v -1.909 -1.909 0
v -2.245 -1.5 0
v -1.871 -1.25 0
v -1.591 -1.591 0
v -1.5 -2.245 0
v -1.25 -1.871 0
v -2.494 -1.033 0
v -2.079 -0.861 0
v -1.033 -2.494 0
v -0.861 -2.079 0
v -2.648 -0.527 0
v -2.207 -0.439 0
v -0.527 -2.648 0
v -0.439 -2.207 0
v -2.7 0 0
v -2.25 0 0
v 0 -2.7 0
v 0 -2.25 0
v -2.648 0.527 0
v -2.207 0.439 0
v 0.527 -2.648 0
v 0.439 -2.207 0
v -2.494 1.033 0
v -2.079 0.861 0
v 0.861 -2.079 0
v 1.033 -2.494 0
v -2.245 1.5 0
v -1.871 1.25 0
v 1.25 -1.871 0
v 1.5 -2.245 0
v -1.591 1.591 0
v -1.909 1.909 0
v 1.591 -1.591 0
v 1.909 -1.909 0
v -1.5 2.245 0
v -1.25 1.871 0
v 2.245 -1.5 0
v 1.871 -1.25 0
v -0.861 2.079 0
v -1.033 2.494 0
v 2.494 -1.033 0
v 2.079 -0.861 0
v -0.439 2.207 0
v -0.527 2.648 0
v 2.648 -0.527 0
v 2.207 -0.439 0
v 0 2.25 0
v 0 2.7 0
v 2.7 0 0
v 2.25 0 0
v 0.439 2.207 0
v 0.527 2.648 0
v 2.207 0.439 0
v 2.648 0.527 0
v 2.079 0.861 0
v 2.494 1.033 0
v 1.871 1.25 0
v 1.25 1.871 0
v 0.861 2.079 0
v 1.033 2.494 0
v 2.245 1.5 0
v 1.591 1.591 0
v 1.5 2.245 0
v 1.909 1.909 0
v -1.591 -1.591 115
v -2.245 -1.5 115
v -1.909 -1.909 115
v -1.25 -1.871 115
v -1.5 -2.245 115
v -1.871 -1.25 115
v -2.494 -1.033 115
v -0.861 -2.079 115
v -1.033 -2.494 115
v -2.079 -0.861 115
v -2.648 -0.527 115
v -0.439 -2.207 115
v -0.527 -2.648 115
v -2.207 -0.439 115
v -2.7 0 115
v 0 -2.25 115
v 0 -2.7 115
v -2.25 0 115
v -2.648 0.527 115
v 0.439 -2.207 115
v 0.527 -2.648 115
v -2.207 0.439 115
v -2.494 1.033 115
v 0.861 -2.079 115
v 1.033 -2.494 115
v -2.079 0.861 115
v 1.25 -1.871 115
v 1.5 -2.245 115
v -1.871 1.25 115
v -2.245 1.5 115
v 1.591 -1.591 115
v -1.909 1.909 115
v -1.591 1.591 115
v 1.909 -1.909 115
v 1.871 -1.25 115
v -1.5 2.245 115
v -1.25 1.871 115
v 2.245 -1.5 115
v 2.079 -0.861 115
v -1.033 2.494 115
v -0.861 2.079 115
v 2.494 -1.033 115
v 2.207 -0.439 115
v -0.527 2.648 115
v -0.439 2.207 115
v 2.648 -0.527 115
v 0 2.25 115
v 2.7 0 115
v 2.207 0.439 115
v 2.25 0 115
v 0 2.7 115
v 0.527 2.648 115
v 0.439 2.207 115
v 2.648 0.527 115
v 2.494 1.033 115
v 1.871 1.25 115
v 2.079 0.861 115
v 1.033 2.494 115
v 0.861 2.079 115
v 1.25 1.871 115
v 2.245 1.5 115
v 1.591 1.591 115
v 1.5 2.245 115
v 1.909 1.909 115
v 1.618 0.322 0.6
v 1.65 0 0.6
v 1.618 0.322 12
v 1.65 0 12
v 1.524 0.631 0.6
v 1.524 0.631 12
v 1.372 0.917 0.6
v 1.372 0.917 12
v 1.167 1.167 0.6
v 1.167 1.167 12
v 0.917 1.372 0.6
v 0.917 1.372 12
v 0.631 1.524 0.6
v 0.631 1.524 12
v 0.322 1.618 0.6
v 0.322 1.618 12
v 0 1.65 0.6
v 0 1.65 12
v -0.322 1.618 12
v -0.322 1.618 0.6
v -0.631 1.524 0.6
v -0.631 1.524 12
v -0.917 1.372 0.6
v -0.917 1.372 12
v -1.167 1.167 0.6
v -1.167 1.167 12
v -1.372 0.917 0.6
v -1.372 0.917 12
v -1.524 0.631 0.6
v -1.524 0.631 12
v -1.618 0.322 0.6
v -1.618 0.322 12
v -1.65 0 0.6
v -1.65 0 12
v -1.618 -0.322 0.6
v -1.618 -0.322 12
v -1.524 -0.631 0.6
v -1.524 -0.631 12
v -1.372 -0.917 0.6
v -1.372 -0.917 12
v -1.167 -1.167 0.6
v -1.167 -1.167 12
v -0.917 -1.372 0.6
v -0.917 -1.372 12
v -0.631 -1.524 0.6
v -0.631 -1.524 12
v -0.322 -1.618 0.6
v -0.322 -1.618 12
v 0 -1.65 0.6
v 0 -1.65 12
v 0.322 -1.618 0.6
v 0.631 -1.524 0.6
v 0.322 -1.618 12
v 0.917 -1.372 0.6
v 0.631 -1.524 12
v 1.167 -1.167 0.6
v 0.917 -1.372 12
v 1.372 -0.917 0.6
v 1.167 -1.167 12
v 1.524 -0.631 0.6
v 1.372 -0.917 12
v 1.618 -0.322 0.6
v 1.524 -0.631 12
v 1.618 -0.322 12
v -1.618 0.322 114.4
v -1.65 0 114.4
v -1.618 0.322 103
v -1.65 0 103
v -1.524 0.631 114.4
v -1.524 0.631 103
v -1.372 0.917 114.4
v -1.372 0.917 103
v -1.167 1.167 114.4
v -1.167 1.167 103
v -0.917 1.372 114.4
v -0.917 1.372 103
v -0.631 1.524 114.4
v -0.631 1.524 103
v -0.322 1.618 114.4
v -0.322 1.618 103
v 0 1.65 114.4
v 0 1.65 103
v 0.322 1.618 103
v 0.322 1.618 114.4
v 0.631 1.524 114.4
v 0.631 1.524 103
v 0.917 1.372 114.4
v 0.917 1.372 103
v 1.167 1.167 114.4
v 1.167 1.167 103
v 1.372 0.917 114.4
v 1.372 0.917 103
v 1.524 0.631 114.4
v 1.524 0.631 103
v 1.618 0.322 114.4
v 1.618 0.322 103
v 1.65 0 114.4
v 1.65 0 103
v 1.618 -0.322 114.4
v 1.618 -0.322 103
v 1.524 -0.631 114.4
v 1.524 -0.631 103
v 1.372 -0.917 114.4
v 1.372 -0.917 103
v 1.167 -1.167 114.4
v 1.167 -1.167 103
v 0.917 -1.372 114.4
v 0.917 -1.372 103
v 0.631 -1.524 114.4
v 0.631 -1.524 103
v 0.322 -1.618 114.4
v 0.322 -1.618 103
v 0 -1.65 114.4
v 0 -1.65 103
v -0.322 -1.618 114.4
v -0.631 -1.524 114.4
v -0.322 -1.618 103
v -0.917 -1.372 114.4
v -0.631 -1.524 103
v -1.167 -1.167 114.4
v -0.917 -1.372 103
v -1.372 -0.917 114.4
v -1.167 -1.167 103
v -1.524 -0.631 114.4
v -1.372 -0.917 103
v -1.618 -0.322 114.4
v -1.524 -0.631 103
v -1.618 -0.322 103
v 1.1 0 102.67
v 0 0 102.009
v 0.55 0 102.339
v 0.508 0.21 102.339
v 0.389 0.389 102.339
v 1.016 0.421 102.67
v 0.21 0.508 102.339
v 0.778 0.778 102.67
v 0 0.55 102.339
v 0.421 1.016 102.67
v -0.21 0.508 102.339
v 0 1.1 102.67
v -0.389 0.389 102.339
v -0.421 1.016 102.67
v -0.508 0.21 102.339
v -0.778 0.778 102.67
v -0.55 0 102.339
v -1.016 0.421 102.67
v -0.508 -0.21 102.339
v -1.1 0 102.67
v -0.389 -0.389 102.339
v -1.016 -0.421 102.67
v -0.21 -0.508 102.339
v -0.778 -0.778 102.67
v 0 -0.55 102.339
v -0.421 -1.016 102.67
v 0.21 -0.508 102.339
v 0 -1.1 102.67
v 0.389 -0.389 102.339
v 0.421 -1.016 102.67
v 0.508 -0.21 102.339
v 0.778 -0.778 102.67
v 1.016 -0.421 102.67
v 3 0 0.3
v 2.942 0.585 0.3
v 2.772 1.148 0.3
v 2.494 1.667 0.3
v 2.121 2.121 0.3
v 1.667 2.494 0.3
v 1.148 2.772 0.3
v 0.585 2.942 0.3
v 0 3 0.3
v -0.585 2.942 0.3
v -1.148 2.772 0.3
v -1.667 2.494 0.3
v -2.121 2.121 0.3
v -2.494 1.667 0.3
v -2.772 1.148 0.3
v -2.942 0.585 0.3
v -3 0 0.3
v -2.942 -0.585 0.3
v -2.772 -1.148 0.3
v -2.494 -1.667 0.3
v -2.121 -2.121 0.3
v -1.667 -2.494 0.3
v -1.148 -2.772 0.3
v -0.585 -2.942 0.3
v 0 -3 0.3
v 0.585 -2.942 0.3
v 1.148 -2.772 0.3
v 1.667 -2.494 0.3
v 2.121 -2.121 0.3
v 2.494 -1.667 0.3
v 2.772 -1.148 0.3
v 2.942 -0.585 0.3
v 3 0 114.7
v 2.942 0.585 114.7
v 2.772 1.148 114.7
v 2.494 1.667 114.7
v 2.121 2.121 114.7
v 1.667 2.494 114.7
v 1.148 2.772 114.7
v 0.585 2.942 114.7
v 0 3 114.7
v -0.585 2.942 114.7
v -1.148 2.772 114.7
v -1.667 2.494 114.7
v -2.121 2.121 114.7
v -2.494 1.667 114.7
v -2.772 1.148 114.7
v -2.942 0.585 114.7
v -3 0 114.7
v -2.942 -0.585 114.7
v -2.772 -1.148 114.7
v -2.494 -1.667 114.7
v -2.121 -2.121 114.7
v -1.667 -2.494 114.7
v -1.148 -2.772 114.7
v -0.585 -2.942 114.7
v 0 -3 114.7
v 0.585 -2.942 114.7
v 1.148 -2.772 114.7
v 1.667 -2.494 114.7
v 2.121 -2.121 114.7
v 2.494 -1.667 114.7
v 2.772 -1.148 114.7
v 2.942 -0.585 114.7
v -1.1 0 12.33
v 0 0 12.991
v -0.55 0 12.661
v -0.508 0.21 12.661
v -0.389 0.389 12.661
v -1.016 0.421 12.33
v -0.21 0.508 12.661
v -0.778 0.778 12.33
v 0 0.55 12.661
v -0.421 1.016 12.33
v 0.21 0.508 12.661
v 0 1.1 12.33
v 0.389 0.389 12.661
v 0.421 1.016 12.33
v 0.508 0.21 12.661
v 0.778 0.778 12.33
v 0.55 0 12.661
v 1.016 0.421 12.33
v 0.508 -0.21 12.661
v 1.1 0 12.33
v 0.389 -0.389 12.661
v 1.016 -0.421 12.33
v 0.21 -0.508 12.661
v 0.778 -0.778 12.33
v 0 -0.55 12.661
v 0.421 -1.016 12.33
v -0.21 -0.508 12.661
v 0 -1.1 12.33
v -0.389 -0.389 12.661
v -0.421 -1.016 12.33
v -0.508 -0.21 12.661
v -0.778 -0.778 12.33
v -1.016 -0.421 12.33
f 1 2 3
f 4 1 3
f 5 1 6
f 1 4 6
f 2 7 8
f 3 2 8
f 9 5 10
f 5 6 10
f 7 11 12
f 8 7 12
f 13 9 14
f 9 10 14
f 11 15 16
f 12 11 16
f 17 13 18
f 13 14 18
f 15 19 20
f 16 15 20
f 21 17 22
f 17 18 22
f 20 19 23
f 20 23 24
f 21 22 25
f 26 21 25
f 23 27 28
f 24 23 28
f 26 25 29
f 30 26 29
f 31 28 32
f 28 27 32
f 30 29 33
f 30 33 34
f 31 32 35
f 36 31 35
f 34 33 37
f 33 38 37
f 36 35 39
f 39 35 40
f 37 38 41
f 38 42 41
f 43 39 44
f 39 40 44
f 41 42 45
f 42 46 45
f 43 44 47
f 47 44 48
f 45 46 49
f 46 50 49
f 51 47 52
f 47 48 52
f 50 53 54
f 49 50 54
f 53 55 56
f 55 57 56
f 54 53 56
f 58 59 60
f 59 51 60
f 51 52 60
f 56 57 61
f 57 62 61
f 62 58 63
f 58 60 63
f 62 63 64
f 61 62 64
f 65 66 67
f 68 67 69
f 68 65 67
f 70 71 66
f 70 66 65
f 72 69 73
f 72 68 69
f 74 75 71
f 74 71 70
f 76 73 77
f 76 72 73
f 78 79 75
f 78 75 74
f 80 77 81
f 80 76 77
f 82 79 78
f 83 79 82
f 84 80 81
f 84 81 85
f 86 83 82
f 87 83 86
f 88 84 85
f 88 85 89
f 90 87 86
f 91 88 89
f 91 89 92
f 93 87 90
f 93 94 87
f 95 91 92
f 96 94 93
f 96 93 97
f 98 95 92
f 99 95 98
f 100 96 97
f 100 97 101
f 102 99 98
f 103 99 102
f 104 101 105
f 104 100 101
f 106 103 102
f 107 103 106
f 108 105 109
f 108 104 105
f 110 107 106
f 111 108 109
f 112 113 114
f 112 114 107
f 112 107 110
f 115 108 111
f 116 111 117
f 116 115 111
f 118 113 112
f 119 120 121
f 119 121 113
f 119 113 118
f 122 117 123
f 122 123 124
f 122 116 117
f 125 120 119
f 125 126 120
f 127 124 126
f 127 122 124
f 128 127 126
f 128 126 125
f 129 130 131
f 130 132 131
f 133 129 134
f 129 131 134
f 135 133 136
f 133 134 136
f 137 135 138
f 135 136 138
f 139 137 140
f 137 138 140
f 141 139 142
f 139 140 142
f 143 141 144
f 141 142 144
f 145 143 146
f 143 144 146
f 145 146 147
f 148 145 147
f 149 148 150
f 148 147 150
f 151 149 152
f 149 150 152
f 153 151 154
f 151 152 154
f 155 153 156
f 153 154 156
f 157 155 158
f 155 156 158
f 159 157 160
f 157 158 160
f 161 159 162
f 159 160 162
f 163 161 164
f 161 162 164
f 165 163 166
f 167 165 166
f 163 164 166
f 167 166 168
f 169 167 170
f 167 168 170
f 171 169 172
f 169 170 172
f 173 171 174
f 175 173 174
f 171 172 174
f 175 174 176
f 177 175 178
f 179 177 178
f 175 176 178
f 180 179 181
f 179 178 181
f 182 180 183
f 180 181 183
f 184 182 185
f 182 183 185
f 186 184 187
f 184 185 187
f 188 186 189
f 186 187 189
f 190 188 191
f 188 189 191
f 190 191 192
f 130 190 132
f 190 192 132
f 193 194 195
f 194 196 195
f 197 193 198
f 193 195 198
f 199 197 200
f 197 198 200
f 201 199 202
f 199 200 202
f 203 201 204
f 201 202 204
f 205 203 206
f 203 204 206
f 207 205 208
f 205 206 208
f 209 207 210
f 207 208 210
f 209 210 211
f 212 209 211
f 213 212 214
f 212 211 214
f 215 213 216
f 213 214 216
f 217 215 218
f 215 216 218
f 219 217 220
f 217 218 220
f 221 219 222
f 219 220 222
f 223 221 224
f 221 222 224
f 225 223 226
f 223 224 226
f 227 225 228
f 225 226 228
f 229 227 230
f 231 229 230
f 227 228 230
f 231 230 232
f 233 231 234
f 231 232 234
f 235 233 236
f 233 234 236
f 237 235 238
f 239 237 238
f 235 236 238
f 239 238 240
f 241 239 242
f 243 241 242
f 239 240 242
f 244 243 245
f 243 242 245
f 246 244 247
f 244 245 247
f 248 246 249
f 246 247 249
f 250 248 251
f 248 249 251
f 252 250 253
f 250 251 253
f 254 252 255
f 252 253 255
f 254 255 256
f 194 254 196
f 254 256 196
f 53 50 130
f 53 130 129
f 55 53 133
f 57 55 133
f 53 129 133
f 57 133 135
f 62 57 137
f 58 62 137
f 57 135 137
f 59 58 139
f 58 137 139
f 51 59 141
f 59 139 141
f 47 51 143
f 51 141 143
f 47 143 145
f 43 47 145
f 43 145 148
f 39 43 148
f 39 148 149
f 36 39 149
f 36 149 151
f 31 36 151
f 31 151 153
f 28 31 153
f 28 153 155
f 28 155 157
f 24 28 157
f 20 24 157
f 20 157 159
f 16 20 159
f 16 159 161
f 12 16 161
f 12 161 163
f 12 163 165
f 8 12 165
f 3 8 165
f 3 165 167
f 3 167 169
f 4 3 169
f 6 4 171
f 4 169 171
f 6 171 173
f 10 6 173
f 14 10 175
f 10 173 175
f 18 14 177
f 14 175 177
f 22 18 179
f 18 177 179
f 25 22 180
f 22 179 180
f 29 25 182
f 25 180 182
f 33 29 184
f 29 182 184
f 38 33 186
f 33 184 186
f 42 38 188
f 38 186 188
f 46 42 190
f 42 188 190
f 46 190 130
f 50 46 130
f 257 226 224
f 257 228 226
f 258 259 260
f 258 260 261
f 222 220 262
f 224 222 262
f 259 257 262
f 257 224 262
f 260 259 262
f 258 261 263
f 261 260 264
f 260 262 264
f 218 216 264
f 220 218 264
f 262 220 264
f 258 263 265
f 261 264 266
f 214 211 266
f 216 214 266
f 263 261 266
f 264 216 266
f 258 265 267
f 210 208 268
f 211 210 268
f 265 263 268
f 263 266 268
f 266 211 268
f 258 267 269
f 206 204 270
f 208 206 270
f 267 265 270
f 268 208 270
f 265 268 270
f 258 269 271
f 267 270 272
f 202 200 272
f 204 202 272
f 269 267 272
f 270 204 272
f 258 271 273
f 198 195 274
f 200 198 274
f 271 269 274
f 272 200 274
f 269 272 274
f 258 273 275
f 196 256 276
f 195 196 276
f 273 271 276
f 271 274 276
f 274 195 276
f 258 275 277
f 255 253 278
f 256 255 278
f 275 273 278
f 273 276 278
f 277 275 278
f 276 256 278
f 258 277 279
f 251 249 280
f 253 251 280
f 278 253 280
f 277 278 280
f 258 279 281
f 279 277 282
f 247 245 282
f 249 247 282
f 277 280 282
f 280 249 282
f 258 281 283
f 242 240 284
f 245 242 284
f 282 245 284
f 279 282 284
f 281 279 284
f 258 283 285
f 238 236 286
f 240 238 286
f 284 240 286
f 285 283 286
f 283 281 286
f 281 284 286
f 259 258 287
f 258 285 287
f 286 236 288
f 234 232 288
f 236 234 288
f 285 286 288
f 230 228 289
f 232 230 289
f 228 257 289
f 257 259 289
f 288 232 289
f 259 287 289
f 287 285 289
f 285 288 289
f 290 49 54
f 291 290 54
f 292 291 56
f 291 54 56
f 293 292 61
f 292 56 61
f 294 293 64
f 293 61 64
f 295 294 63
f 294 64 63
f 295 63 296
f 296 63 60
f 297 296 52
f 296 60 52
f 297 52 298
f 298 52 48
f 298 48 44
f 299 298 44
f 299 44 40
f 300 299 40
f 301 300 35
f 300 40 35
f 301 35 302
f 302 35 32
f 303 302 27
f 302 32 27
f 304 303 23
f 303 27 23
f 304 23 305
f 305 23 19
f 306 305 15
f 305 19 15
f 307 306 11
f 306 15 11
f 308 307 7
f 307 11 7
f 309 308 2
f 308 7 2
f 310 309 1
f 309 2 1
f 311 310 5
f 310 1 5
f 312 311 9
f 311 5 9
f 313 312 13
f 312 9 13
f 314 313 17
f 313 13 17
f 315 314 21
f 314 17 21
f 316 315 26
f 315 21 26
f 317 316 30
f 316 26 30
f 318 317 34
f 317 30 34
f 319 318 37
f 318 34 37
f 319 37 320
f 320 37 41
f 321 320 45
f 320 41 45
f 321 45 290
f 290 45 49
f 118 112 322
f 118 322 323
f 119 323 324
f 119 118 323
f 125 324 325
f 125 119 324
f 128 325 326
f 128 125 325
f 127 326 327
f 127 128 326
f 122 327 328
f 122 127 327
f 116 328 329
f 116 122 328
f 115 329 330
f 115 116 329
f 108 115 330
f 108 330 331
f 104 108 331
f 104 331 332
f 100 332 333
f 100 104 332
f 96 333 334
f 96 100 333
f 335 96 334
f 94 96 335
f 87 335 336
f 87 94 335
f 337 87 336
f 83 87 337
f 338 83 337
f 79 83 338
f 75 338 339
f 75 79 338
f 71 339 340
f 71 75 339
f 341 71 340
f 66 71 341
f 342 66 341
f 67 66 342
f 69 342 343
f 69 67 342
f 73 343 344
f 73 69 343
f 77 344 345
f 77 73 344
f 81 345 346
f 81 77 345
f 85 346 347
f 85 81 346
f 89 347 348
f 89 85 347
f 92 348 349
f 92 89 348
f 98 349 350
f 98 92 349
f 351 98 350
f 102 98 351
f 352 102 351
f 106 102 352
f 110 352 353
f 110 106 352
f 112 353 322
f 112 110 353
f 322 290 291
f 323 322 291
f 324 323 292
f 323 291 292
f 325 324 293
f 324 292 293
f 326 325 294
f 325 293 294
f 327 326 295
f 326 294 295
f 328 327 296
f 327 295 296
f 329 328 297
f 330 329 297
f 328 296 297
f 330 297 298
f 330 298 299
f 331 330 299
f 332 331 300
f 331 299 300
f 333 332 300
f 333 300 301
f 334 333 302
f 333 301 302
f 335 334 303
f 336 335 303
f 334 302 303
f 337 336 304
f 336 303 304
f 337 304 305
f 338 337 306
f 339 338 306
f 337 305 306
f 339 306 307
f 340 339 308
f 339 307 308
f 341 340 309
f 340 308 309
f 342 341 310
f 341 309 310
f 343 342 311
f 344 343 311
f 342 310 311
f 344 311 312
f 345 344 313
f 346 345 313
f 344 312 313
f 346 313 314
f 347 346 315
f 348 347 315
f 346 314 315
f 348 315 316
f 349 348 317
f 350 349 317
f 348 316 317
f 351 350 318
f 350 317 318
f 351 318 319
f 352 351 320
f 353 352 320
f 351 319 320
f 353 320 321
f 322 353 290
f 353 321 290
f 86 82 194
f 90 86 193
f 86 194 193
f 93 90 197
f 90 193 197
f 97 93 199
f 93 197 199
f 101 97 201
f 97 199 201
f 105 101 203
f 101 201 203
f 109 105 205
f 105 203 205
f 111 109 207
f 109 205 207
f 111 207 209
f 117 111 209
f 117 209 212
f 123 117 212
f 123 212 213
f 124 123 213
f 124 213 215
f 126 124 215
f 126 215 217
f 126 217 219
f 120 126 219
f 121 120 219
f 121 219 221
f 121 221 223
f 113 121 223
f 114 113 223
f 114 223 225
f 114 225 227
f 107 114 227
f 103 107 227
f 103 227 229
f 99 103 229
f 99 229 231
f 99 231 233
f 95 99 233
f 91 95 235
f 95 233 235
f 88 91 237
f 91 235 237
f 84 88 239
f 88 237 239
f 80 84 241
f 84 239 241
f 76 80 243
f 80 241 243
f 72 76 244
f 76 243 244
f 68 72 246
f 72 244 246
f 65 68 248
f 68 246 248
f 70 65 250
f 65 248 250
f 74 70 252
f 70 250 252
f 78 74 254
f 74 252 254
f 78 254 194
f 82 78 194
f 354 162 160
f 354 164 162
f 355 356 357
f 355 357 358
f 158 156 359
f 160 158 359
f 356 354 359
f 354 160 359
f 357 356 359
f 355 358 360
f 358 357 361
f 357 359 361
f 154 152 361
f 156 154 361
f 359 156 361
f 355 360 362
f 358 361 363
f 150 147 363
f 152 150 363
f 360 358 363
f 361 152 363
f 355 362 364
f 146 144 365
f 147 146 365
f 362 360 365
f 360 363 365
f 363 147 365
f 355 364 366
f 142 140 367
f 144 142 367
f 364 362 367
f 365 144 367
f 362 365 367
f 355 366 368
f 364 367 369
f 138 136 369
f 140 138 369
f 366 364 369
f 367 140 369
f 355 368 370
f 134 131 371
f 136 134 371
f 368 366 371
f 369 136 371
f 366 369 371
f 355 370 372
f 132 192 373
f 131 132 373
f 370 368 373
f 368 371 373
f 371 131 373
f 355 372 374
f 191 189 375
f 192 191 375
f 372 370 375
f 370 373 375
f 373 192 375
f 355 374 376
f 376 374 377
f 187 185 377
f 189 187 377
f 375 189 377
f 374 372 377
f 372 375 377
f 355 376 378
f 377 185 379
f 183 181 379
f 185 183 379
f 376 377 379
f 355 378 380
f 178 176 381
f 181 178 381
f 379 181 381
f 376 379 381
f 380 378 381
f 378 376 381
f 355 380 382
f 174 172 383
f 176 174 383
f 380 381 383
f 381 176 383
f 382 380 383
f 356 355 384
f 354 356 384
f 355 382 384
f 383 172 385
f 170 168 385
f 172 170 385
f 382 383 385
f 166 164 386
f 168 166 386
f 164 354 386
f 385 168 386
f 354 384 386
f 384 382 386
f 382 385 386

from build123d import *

# Parameters (mm, degrees)
SKETCH_236_R                = 3
EXTRUDE_290_DEPTH           = 115
HOLE_WIZARD_M41_D           = 3.3
HOLE_WIZARD_M41_DEPTH       = 12
HOLE_WIZARD_M41_CSINK_D     = 4.5
HOLE_WIZARD_M41_CSINK_ANGLE = 90
HOLE_WIZARD_M41_TIP         = 0.991420021
HOLE_WIZARD_M42_D           = 3.3
HOLE_WIZARD_M42_DEPTH       = 12
HOLE_WIZARD_M42_CSINK_D     = 4.5
HOLE_WIZARD_M42_CSINK_ANGLE = 90
HOLE_WIZARD_M42_TIP         = 0.991420021
CHAMFER_1_SIZE              = 0.3


with BuildPart() as part:
    # Sketch 236 → Extrude 290 (new body)
    with BuildSketch(Plane.XY):
        Circle(SKETCH_236_R)
    extrude(amount=EXTRUDE_290_DEPTH)

    # Отверстие обработанное метчиком M41
    with Locations(Plane.XY.offset(115)):
        with Locations((0, 0)):
            CounterSinkHole(HOLE_WIZARD_M41_D / 2, HOLE_WIZARD_M41_CSINK_D / 2, depth=HOLE_WIZARD_M41_DEPTH, counter_sink_angle=HOLE_WIZARD_M41_CSINK_ANGLE)
            with Locations((0, 0, -(HOLE_WIZARD_M41_DEPTH + HOLE_WIZARD_M41_TIP / 2))):  # 118° drill point
                Cone(0, HOLE_WIZARD_M41_D / 2, HOLE_WIZARD_M41_TIP, mode=Mode.SUBTRACT)

    # Отверстие обработанное метчиком M42
    with Locations(Plane(origin=(0, 0, 0), x_dir=(-1, 0, 0), z_dir=(0, 0, -1))):
        with Locations((0, 0)):
            CounterSinkHole(HOLE_WIZARD_M42_D / 2, HOLE_WIZARD_M42_CSINK_D / 2, depth=HOLE_WIZARD_M42_DEPTH, counter_sink_angle=HOLE_WIZARD_M42_CSINK_ANGLE)
            with Locations((0, 0, -(HOLE_WIZARD_M42_DEPTH + HOLE_WIZARD_M42_TIP / 2))):  # 118° drill point
                Cone(0, HOLE_WIZARD_M42_D / 2, HOLE_WIZARD_M42_TIP, mode=Mode.SUBTRACT)

    # Фаска1
    chamfer_1_edges = [part.edges().sort_by_distance(p)[0] for p in [
        (-3, 0, 0),
        (-3, 0, 115),
    ]]
    chamfer(chamfer_1_edges, length=CHAMFER_1_SIZE)


solid = part.part
